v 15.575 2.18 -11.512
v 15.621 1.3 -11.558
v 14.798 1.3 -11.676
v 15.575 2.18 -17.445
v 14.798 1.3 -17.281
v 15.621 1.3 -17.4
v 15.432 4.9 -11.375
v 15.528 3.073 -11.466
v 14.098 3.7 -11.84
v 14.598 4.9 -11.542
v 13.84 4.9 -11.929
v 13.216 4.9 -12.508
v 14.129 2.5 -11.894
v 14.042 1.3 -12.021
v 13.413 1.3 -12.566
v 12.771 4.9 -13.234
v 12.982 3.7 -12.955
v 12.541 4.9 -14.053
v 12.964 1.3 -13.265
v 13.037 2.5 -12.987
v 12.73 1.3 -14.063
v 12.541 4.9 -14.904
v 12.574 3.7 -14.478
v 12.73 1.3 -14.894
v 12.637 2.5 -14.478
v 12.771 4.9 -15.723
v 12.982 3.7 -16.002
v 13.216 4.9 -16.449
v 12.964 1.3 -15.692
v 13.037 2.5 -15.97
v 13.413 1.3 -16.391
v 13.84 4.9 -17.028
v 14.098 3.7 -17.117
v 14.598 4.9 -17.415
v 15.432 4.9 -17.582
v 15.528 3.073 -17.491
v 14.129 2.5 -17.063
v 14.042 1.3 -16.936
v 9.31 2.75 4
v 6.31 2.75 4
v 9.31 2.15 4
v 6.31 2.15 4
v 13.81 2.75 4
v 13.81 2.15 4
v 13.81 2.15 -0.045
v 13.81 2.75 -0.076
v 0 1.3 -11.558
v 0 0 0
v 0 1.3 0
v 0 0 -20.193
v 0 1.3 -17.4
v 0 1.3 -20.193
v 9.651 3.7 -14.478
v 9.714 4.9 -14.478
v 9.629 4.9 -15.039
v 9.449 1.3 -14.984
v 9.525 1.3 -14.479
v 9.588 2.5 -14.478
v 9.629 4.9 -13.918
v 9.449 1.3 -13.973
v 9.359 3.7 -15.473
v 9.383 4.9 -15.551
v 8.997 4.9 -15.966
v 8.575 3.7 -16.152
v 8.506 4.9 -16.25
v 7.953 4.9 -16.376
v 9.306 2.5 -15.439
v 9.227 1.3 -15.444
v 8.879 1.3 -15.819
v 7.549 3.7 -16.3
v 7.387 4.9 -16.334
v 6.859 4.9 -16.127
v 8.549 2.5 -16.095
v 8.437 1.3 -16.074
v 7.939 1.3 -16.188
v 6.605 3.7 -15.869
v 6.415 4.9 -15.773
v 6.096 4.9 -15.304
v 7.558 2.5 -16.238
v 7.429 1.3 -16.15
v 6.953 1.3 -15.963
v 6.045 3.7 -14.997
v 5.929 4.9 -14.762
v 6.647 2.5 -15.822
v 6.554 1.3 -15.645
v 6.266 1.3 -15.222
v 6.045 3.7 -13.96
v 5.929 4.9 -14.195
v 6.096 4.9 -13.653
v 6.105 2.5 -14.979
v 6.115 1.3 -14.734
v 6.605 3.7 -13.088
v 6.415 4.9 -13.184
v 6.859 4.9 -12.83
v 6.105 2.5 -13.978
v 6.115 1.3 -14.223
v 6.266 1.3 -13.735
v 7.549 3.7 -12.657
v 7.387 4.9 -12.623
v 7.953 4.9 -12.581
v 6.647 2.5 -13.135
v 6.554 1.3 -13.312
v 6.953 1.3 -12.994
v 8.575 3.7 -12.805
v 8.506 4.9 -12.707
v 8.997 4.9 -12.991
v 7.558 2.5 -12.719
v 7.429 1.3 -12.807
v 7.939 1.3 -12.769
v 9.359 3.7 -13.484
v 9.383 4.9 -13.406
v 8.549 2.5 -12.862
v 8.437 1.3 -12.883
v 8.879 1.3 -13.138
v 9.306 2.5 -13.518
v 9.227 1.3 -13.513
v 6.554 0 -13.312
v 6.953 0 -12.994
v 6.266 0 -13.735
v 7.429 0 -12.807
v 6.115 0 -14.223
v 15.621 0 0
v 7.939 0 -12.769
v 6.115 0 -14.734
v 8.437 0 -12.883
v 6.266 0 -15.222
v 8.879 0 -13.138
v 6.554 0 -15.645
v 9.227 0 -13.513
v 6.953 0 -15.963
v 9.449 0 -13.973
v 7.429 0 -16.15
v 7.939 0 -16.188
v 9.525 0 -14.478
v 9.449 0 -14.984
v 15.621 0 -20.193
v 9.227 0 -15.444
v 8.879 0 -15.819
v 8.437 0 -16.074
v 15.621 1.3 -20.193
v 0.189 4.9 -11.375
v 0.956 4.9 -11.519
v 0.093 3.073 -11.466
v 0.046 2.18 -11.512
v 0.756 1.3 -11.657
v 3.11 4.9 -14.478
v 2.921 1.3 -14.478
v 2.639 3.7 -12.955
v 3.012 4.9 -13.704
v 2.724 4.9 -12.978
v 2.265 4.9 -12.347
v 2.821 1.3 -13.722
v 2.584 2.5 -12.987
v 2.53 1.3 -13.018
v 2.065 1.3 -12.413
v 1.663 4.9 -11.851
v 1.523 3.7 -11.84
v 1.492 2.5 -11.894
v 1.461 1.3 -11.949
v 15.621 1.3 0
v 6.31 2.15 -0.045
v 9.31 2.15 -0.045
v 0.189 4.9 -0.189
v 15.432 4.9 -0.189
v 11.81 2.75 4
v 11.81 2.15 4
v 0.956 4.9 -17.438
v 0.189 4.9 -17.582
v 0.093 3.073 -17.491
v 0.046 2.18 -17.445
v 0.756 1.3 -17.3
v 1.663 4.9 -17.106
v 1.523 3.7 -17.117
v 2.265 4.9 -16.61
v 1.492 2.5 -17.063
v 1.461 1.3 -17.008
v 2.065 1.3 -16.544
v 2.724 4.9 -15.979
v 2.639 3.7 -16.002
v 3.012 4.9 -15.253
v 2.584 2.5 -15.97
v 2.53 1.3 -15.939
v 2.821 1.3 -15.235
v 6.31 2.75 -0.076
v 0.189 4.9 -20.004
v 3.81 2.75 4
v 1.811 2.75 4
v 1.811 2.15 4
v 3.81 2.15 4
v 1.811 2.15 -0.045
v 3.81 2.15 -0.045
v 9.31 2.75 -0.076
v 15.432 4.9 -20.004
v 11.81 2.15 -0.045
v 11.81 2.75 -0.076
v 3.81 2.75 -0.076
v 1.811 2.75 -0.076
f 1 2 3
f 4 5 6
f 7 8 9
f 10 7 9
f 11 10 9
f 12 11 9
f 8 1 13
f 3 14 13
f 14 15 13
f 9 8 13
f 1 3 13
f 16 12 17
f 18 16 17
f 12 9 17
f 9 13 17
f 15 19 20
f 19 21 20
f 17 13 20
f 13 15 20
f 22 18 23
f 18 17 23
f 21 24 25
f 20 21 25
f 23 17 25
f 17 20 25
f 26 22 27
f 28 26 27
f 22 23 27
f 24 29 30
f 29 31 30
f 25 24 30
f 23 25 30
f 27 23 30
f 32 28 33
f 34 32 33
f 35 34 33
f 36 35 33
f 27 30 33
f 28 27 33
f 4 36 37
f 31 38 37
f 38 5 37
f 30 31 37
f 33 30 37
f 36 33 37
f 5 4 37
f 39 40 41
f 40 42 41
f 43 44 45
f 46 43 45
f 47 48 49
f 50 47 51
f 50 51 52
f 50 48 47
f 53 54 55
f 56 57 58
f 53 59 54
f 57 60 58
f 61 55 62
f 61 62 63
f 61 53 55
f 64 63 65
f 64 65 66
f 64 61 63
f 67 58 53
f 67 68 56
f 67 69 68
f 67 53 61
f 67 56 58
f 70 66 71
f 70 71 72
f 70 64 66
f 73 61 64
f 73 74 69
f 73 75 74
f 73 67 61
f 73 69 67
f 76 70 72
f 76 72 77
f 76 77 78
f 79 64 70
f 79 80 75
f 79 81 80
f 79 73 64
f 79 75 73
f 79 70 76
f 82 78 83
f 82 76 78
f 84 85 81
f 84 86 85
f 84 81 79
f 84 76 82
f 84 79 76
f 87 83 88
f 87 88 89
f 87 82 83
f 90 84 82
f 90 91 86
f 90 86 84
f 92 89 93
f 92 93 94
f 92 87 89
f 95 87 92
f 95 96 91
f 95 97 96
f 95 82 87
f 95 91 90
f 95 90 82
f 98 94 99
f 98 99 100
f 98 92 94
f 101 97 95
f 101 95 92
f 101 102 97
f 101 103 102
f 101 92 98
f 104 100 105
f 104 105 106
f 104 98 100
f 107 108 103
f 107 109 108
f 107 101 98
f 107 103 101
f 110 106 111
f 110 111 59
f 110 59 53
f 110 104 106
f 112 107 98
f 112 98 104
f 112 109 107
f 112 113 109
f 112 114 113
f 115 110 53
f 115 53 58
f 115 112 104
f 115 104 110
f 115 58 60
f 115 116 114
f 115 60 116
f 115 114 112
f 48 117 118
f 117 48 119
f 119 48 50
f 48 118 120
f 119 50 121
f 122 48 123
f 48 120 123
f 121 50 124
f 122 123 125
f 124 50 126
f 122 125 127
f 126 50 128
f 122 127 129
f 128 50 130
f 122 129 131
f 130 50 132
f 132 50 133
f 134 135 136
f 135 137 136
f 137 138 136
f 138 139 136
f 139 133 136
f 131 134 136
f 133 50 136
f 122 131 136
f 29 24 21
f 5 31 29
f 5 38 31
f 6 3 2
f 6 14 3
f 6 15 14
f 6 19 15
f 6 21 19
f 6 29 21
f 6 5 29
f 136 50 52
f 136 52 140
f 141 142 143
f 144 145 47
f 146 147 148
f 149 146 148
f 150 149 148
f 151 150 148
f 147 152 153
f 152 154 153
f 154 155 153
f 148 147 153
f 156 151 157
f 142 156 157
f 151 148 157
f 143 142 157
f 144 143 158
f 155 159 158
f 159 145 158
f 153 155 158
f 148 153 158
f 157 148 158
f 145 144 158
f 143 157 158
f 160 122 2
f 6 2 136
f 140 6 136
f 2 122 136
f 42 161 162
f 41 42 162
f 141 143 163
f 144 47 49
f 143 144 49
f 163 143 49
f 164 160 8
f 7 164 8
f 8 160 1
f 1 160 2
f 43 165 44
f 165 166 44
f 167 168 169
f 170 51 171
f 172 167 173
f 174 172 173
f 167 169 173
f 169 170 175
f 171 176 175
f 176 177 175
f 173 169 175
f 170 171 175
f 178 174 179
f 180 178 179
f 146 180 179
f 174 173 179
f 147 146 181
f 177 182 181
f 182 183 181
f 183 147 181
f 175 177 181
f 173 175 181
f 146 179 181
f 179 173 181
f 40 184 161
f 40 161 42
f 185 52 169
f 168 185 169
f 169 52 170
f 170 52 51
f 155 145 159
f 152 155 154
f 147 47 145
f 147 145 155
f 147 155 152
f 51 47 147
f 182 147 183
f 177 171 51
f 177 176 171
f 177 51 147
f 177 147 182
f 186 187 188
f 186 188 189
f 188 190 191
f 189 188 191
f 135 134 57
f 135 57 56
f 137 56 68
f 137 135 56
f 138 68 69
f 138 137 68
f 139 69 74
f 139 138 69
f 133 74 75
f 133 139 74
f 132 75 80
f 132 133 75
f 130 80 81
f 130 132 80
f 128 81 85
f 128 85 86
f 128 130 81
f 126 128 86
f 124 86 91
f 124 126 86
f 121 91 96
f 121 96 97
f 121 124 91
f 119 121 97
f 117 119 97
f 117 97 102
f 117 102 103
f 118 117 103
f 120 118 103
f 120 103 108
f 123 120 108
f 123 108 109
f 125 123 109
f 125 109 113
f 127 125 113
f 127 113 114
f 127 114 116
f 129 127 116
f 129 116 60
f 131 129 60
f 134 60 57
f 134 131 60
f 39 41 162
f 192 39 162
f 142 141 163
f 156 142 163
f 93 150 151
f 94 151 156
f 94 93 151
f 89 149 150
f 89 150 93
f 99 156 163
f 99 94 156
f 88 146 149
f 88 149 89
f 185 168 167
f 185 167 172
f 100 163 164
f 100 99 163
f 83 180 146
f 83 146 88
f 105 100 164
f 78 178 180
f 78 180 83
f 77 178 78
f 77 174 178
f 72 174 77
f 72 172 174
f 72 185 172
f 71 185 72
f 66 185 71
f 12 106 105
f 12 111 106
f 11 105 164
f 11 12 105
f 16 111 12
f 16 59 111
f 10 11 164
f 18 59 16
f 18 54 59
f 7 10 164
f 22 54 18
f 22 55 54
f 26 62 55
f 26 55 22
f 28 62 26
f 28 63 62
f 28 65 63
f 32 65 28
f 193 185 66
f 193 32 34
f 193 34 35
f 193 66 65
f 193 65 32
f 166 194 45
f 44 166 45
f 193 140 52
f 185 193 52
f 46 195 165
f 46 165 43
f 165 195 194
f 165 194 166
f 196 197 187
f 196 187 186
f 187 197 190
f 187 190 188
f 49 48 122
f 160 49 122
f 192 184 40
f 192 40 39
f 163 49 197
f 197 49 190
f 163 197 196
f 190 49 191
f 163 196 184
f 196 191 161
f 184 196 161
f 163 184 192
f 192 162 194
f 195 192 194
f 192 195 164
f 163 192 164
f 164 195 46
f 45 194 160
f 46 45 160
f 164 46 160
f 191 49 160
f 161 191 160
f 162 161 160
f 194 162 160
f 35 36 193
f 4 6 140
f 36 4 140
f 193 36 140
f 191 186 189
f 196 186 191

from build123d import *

# Parameters (mm, degrees)
SKETCH1_W                = 15.621
SKETCH1_H                = 20.193
SKETCH1_R                = 1.7145
BOSS_EXTRUDE1_DEPTH      = 1.3
SKETCH2_R                = 1.7145
BOSS_EXTRUDE2_DEPTH      = 3.6
BOSS_EXTRUDE2_DRAFT      = 3
SKETCH3_W                = 2
SKETCH3_H                = 2.155291512
SKETCH3_H_2              = 4
SKETCH3_W_2              = 1.5
SKETCH3_H_3              = 2.998822354
BOSS_EXTRUDE3_DEPTH      = 0.3
BOSS_EXTRUDE3_DEPTH_BACK = 0.3


with BuildPart() as part:
    # Sketch1 → Boss-Extrude1 (new body)
    with BuildSketch(Plane(origin=(0, 0, 0), x_dir=(1, 0, 0), z_dir=(0, 1, 0))):
        with Locations((7.8105, 10.0965)):
            Rectangle(SKETCH1_W, SKETCH1_H)
        with Locations((7.8105, 14.4785)):
            Circle(SKETCH1_R, mode=Mode.SUBTRACT)
    extrude(amount=BOSS_EXTRUDE1_DEPTH)


with BuildPart() as boss_extrude2_tool:
    # Sketch2 → Boss-Extrude2 (with draft: the straight prism first)
    with BuildSketch(Plane(origin=(0, 1.3, 0), x_dir=(1, 0, 0), z_dir=(0, 1, 0))):
        with BuildLine():
            Line((15.621, 20.193), (0, 20.193))
            Line((0, 20.193), (0, 17.3995))
            ThreePointArc((0, 17.3995), (2.065458908, 16.543958908), (2.921, 14.4785))
            ThreePointArc((2.921, 14.4785), (2.065458908, 12.413041092), (0, 11.5575))
            Line((0, 11.5575), (0, 0))
            Line((0, 0), (15.621, 0))
            Line((15.621, 0), (15.621, 11.5575))
            ThreePointArc((15.621, 11.5575), (12.7, 14.4785), (15.621, 17.3995))
            Line((15.621, 17.3995), (15.621, 20.193))
        make_face()
        with Locations((7.8105, 14.4785)):
            Circle(SKETCH2_R, mode=Mode.SUBTRACT)
    extrude(amount=BOSS_EXTRUDE2_DEPTH)
    # Boss-Extrude2: the draft: its side faces are tilted about the plane it starts from
    boss_extrude2_sides = [boss_extrude2_tool.faces().sort_by_distance(p)[0] for p in [
        (15.621, 3.1, -18.79625),
        (6.096, 3.1, -14.4785),
        (15.621, 3.1, -5.77875),
        (7.8105, 3.1, 0),
        (0, 3.1, -5.77875),
        (2.921, 3.1, -14.4785),
        (0, 3.1, -18.79625),
        (7.8105, 3.1, -20.193),
        (12.7, 3.1, -14.4785),
    ]]
    draft(boss_extrude2_sides, Plane(origin=(0, 1.3, 0), x_dir=(1, 0, 0), z_dir=(0, 1, 0)), BOSS_EXTRUDE2_DRAFT)


with BuildPart() as part_1:
    add(part.part)

    # Boss-Extrude2: add boss_extrude2_tool
    add(boss_extrude2_tool.part)

    # Sketch3 → Boss-Extrude3 (add, two sides)
    with BuildSketch(Plane(origin=(0, 2.45, 0), x_dir=(1, 0, 0), z_dir=(0, 1, 0))) as boss_extrude3_sk:
        with Locations((2.8105, 1.077645756)):
            Rectangle(SKETCH3_W, SKETCH3_H)
        with Locations((2.8105, -2)):
            Rectangle(SKETCH3_W, SKETCH3_H_2)
        with Locations((12.8105, 1.077645756)):
            Rectangle(SKETCH3_W, SKETCH3_H)
        with Locations((12.8105, -2)):
            Rectangle(SKETCH3_W, SKETCH3_H_2)
        with Locations((7.0605, 1.499411177)):
            Rectangle(SKETCH3_W_2, SKETCH3_H_3)
        Polygon((7.8105, 0), (6.3105, 0), (6.3105, -4), (9.3105, -4), (9.3105, 0), align=None)
        with Locations((8.5605, 1.499411177)):
            Rectangle(SKETCH3_W_2, SKETCH3_H_3)
    extrude(amount=BOSS_EXTRUDE3_DEPTH)
    extrude(boss_extrude3_sk.sketch, amount=-BOSS_EXTRUDE3_DEPTH_BACK)


solid = part_1.part
